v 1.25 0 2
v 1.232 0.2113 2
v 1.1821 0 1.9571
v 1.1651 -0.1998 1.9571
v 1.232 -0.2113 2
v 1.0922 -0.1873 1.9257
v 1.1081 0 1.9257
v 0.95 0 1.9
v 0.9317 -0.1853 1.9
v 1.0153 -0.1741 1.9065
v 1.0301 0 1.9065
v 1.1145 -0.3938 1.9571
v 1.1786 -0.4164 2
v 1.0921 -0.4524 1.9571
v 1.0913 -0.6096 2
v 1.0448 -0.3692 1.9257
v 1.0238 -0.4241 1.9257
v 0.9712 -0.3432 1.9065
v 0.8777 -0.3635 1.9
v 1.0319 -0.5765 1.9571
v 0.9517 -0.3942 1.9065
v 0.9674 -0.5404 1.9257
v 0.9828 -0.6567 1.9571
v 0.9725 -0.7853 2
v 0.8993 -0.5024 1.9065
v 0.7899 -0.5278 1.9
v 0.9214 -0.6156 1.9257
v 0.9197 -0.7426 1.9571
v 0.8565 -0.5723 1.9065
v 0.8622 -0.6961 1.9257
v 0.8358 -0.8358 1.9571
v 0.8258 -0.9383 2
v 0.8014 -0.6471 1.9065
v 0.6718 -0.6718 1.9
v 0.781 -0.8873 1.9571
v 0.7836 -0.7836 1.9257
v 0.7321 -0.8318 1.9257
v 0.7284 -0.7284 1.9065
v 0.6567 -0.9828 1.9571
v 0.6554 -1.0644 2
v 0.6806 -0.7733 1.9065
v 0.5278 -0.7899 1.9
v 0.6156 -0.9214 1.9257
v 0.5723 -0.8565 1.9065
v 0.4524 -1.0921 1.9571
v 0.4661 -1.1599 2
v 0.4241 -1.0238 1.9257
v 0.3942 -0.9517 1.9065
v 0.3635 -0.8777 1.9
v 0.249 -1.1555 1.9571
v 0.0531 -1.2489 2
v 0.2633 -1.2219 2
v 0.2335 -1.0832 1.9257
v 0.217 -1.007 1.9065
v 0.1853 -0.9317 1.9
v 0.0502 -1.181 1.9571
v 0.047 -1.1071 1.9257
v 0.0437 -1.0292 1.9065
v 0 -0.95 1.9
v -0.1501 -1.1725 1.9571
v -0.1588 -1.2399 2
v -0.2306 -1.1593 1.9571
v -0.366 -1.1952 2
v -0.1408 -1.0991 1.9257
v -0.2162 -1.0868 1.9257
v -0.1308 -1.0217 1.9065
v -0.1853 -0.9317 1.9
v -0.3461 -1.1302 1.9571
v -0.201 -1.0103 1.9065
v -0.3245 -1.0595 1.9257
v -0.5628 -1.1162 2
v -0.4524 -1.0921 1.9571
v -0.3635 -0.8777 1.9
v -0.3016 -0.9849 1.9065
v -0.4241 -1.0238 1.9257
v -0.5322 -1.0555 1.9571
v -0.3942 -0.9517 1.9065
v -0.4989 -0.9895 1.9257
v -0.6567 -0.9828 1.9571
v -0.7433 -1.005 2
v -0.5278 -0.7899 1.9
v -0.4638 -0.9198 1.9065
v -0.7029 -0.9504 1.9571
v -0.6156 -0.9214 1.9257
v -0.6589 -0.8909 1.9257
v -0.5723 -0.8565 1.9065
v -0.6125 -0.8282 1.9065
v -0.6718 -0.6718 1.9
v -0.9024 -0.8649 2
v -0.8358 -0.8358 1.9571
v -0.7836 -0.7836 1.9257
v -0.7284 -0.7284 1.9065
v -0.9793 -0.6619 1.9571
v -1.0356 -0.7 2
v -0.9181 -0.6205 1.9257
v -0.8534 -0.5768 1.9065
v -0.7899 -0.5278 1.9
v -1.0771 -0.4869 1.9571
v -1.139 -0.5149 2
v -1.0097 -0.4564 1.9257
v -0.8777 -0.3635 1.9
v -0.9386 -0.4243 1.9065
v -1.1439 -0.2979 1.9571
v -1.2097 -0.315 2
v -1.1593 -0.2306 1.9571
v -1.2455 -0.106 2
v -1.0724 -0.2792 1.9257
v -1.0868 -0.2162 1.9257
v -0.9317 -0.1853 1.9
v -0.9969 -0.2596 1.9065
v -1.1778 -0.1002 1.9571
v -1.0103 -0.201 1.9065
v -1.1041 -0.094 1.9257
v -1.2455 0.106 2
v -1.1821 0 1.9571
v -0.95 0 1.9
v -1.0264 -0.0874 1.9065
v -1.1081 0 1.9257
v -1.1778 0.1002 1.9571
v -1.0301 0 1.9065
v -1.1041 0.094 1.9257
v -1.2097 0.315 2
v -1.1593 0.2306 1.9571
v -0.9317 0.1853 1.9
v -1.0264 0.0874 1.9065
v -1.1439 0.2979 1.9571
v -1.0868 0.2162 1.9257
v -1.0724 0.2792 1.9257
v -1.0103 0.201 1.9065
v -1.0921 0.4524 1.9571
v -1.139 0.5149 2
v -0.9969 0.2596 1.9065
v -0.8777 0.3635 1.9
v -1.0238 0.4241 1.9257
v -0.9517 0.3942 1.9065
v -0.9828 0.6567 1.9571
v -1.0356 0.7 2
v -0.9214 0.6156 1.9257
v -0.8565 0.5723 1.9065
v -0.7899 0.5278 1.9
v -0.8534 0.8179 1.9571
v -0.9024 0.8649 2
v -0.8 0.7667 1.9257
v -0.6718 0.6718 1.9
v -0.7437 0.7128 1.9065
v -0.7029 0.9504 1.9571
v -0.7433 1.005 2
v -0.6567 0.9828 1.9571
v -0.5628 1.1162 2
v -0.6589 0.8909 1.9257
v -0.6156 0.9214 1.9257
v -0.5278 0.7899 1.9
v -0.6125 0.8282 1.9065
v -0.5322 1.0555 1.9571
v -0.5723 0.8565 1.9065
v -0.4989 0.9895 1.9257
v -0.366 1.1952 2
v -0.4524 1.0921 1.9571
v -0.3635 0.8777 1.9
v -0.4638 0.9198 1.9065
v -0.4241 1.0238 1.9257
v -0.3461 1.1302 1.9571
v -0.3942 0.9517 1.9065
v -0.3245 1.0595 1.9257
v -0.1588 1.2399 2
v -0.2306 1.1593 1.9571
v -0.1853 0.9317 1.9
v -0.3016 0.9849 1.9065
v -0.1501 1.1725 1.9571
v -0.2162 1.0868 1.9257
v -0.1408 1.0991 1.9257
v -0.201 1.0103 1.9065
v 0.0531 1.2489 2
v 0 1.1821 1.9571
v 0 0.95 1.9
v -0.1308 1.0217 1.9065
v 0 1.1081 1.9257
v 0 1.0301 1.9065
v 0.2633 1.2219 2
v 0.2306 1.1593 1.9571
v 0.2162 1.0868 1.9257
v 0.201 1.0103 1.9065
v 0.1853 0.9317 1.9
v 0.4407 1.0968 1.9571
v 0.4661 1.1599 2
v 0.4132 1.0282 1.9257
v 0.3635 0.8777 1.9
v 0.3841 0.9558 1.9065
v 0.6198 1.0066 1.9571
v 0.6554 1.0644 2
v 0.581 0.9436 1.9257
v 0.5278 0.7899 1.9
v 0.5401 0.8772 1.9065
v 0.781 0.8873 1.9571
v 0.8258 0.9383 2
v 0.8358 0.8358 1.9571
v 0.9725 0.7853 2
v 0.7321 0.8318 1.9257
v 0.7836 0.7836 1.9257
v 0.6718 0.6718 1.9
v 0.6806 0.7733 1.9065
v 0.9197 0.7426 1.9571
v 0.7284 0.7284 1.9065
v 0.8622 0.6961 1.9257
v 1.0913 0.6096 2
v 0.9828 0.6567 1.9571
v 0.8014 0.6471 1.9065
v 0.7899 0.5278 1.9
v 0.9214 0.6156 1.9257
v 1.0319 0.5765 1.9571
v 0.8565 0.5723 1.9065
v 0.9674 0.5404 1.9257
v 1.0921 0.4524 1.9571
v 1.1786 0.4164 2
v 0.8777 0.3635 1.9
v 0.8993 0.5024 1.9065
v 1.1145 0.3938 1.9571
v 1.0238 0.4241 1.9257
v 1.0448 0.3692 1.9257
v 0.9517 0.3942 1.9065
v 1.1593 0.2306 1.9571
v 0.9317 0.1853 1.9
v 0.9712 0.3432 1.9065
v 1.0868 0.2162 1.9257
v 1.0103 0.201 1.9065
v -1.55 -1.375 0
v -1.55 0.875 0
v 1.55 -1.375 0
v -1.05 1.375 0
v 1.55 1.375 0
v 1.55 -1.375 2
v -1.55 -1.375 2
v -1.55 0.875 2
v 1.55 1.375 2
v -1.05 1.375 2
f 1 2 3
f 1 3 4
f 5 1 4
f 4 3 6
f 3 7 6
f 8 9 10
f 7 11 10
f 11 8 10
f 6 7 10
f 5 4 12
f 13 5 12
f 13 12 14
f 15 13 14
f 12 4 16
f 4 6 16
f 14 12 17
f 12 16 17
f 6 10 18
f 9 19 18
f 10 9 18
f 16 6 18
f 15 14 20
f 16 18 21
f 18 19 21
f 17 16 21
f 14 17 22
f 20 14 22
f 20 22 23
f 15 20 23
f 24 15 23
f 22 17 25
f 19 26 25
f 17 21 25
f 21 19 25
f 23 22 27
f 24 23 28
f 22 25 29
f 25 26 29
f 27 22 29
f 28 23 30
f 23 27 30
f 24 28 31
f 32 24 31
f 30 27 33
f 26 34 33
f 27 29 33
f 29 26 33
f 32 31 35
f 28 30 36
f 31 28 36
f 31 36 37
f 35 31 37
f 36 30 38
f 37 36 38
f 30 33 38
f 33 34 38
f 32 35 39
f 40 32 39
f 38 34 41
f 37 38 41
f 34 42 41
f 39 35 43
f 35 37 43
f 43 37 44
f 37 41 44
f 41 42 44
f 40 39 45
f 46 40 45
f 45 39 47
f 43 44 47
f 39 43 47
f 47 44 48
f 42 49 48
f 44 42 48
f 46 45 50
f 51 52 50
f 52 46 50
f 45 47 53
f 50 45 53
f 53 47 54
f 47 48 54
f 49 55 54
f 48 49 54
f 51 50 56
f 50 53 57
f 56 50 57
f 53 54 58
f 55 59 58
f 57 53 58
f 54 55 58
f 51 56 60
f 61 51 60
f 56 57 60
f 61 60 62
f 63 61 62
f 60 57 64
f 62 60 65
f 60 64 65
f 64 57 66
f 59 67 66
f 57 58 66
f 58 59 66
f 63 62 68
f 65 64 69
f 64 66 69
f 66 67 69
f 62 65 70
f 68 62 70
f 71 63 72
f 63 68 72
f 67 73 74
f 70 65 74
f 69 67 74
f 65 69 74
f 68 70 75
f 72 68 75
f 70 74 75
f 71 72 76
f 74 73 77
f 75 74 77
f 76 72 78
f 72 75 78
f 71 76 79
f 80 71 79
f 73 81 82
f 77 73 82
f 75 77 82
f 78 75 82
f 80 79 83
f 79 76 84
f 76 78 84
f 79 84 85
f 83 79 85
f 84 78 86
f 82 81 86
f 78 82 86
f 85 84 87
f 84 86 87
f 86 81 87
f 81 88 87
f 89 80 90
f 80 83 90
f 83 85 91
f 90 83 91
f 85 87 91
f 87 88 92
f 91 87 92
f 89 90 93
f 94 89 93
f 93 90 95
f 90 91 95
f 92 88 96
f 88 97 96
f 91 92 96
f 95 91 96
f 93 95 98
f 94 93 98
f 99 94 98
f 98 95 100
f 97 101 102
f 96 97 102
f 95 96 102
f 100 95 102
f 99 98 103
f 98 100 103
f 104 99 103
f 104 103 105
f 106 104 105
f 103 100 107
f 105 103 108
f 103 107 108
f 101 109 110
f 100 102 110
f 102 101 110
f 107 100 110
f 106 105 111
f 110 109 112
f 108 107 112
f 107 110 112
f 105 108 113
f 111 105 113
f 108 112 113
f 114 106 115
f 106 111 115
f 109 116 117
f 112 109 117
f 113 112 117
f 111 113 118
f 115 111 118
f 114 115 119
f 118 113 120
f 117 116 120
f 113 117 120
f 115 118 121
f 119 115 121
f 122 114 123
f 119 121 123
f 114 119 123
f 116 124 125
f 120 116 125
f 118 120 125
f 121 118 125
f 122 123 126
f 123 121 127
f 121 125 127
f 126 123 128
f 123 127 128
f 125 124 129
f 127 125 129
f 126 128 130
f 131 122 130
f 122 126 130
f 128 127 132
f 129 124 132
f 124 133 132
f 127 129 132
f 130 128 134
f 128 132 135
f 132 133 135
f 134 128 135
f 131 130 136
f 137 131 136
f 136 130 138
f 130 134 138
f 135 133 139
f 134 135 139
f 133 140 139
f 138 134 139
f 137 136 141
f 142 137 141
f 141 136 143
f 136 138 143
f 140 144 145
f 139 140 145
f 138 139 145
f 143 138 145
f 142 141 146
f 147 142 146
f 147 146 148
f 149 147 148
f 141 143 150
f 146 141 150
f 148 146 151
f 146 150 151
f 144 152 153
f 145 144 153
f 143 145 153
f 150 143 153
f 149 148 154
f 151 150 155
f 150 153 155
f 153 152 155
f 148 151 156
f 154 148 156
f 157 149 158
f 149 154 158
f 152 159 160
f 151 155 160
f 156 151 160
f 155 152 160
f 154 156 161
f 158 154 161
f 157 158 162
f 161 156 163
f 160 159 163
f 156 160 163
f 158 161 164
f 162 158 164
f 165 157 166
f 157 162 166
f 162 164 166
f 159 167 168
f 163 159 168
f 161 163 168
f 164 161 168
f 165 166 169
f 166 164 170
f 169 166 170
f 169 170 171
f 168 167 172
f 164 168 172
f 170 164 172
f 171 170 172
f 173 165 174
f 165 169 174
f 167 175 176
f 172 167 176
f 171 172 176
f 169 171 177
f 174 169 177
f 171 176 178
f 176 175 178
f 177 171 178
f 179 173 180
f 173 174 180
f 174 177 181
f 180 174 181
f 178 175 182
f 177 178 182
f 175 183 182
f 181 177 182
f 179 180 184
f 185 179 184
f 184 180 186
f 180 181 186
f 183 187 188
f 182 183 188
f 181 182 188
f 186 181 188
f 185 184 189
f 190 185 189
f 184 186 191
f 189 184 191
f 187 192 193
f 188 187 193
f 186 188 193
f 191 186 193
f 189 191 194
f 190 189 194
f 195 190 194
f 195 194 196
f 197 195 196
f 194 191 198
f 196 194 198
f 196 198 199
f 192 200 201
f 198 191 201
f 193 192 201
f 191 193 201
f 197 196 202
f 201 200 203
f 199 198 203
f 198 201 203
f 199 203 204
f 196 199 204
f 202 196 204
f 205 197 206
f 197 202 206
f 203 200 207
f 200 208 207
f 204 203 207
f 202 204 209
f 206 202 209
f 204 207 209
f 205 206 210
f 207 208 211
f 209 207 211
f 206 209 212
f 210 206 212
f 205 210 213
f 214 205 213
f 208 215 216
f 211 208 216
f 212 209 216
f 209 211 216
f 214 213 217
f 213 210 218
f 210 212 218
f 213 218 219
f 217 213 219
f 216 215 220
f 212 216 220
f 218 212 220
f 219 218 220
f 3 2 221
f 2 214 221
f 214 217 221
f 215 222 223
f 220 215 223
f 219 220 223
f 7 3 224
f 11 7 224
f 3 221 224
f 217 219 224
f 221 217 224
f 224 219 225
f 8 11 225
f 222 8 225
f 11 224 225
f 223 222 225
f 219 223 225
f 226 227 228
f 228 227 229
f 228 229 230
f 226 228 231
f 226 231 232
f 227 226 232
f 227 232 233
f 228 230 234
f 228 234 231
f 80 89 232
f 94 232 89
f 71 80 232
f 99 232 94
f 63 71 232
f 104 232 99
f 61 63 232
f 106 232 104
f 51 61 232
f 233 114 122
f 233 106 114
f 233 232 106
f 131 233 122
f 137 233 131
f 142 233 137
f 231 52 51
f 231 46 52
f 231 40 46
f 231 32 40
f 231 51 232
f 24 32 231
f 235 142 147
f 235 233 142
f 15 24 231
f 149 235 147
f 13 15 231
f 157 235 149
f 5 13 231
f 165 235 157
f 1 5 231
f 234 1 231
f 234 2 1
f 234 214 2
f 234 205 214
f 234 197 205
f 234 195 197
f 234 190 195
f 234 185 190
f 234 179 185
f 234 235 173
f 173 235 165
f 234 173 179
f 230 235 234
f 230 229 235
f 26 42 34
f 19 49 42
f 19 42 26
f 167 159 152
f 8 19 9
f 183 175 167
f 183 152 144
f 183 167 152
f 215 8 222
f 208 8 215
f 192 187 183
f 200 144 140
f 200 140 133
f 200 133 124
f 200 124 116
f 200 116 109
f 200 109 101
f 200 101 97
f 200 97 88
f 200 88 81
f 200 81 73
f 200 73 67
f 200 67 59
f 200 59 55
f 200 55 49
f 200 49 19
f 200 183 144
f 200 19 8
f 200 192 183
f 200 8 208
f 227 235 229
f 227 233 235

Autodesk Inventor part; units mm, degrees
ref_plane "YZ Plane" through (0, 0, 0) normal (1, 0, 0) x (0, 1, 0)
ref_plane "XZ Plane" through (0, 0, 0) normal (0, 1, 0) x (-1, 0, 0)
ref_plane "XY Plane" through (0, 0, 0) normal (0, 0, 1) x (1, 0, 0)
sketch "Szkic1" plane through (0, 0, 0) normal (0, 0, 1) x (1, 0, 0)
  line L0 (-1.55, 1.375) -> (1.55, 1.375)
  line L1 (1.55, 1.375) -> (1.55, -1.375)
  line L2 (1.55, -1.375) -> (-1.55, -1.375)
  line L3 (-1.55, -1.375) -> (-1.55, 1.375)
  point P0 (0, 0)
  dimension "d0" = 3.1
  dimension "d1" = 2.75
  dimension "d15" = 1.375
  dimension "d16" = 1.55
extrude "Wyciągnięcie proste1" add sketch "Szkic1" along normal blind 2
chamfer "Faza1" distance 0.5 angle 45 1 edges at (-1.55, 1.375, 1)
sketch "Szkic2" plane through (0, 0, 2) normal (0, 0, 1) x (1, 0, 0)
  line L0 (1.55, 1.375) -> (-1.05, 1.375) projected
  line L1 (-1.55, -1.375) -> (1.55, -1.375) projected
  line L2 (-1.55, 0.875) -> (-1.55, -1.375) projected
  circle A0 centre (0, 0) radius 1.25
  point P0 (0, 0)
  dimension "d7" = 2.75
  dimension "d8" = 1.375
  dimension "d9" = 3.1
  dimension "d10" = 1.55
  dimension "d11" = 2.5
extrude "Wyciągnięcie proste2" cut sketch "Szkic2" against normal blind 0.1
fillet "Zaokrąglenie1" radius 0.5 1 edges at (-1.25, 0, 1.9)
equation "\"d15\" = 0.5 * d1"
equation "\"d16\" = 0.5 * d0"
equation "\"d8\" = 0.5 * d7"
equation "\"d10\" = 0.5 * d9"
properties part number "led od paska ledów"
